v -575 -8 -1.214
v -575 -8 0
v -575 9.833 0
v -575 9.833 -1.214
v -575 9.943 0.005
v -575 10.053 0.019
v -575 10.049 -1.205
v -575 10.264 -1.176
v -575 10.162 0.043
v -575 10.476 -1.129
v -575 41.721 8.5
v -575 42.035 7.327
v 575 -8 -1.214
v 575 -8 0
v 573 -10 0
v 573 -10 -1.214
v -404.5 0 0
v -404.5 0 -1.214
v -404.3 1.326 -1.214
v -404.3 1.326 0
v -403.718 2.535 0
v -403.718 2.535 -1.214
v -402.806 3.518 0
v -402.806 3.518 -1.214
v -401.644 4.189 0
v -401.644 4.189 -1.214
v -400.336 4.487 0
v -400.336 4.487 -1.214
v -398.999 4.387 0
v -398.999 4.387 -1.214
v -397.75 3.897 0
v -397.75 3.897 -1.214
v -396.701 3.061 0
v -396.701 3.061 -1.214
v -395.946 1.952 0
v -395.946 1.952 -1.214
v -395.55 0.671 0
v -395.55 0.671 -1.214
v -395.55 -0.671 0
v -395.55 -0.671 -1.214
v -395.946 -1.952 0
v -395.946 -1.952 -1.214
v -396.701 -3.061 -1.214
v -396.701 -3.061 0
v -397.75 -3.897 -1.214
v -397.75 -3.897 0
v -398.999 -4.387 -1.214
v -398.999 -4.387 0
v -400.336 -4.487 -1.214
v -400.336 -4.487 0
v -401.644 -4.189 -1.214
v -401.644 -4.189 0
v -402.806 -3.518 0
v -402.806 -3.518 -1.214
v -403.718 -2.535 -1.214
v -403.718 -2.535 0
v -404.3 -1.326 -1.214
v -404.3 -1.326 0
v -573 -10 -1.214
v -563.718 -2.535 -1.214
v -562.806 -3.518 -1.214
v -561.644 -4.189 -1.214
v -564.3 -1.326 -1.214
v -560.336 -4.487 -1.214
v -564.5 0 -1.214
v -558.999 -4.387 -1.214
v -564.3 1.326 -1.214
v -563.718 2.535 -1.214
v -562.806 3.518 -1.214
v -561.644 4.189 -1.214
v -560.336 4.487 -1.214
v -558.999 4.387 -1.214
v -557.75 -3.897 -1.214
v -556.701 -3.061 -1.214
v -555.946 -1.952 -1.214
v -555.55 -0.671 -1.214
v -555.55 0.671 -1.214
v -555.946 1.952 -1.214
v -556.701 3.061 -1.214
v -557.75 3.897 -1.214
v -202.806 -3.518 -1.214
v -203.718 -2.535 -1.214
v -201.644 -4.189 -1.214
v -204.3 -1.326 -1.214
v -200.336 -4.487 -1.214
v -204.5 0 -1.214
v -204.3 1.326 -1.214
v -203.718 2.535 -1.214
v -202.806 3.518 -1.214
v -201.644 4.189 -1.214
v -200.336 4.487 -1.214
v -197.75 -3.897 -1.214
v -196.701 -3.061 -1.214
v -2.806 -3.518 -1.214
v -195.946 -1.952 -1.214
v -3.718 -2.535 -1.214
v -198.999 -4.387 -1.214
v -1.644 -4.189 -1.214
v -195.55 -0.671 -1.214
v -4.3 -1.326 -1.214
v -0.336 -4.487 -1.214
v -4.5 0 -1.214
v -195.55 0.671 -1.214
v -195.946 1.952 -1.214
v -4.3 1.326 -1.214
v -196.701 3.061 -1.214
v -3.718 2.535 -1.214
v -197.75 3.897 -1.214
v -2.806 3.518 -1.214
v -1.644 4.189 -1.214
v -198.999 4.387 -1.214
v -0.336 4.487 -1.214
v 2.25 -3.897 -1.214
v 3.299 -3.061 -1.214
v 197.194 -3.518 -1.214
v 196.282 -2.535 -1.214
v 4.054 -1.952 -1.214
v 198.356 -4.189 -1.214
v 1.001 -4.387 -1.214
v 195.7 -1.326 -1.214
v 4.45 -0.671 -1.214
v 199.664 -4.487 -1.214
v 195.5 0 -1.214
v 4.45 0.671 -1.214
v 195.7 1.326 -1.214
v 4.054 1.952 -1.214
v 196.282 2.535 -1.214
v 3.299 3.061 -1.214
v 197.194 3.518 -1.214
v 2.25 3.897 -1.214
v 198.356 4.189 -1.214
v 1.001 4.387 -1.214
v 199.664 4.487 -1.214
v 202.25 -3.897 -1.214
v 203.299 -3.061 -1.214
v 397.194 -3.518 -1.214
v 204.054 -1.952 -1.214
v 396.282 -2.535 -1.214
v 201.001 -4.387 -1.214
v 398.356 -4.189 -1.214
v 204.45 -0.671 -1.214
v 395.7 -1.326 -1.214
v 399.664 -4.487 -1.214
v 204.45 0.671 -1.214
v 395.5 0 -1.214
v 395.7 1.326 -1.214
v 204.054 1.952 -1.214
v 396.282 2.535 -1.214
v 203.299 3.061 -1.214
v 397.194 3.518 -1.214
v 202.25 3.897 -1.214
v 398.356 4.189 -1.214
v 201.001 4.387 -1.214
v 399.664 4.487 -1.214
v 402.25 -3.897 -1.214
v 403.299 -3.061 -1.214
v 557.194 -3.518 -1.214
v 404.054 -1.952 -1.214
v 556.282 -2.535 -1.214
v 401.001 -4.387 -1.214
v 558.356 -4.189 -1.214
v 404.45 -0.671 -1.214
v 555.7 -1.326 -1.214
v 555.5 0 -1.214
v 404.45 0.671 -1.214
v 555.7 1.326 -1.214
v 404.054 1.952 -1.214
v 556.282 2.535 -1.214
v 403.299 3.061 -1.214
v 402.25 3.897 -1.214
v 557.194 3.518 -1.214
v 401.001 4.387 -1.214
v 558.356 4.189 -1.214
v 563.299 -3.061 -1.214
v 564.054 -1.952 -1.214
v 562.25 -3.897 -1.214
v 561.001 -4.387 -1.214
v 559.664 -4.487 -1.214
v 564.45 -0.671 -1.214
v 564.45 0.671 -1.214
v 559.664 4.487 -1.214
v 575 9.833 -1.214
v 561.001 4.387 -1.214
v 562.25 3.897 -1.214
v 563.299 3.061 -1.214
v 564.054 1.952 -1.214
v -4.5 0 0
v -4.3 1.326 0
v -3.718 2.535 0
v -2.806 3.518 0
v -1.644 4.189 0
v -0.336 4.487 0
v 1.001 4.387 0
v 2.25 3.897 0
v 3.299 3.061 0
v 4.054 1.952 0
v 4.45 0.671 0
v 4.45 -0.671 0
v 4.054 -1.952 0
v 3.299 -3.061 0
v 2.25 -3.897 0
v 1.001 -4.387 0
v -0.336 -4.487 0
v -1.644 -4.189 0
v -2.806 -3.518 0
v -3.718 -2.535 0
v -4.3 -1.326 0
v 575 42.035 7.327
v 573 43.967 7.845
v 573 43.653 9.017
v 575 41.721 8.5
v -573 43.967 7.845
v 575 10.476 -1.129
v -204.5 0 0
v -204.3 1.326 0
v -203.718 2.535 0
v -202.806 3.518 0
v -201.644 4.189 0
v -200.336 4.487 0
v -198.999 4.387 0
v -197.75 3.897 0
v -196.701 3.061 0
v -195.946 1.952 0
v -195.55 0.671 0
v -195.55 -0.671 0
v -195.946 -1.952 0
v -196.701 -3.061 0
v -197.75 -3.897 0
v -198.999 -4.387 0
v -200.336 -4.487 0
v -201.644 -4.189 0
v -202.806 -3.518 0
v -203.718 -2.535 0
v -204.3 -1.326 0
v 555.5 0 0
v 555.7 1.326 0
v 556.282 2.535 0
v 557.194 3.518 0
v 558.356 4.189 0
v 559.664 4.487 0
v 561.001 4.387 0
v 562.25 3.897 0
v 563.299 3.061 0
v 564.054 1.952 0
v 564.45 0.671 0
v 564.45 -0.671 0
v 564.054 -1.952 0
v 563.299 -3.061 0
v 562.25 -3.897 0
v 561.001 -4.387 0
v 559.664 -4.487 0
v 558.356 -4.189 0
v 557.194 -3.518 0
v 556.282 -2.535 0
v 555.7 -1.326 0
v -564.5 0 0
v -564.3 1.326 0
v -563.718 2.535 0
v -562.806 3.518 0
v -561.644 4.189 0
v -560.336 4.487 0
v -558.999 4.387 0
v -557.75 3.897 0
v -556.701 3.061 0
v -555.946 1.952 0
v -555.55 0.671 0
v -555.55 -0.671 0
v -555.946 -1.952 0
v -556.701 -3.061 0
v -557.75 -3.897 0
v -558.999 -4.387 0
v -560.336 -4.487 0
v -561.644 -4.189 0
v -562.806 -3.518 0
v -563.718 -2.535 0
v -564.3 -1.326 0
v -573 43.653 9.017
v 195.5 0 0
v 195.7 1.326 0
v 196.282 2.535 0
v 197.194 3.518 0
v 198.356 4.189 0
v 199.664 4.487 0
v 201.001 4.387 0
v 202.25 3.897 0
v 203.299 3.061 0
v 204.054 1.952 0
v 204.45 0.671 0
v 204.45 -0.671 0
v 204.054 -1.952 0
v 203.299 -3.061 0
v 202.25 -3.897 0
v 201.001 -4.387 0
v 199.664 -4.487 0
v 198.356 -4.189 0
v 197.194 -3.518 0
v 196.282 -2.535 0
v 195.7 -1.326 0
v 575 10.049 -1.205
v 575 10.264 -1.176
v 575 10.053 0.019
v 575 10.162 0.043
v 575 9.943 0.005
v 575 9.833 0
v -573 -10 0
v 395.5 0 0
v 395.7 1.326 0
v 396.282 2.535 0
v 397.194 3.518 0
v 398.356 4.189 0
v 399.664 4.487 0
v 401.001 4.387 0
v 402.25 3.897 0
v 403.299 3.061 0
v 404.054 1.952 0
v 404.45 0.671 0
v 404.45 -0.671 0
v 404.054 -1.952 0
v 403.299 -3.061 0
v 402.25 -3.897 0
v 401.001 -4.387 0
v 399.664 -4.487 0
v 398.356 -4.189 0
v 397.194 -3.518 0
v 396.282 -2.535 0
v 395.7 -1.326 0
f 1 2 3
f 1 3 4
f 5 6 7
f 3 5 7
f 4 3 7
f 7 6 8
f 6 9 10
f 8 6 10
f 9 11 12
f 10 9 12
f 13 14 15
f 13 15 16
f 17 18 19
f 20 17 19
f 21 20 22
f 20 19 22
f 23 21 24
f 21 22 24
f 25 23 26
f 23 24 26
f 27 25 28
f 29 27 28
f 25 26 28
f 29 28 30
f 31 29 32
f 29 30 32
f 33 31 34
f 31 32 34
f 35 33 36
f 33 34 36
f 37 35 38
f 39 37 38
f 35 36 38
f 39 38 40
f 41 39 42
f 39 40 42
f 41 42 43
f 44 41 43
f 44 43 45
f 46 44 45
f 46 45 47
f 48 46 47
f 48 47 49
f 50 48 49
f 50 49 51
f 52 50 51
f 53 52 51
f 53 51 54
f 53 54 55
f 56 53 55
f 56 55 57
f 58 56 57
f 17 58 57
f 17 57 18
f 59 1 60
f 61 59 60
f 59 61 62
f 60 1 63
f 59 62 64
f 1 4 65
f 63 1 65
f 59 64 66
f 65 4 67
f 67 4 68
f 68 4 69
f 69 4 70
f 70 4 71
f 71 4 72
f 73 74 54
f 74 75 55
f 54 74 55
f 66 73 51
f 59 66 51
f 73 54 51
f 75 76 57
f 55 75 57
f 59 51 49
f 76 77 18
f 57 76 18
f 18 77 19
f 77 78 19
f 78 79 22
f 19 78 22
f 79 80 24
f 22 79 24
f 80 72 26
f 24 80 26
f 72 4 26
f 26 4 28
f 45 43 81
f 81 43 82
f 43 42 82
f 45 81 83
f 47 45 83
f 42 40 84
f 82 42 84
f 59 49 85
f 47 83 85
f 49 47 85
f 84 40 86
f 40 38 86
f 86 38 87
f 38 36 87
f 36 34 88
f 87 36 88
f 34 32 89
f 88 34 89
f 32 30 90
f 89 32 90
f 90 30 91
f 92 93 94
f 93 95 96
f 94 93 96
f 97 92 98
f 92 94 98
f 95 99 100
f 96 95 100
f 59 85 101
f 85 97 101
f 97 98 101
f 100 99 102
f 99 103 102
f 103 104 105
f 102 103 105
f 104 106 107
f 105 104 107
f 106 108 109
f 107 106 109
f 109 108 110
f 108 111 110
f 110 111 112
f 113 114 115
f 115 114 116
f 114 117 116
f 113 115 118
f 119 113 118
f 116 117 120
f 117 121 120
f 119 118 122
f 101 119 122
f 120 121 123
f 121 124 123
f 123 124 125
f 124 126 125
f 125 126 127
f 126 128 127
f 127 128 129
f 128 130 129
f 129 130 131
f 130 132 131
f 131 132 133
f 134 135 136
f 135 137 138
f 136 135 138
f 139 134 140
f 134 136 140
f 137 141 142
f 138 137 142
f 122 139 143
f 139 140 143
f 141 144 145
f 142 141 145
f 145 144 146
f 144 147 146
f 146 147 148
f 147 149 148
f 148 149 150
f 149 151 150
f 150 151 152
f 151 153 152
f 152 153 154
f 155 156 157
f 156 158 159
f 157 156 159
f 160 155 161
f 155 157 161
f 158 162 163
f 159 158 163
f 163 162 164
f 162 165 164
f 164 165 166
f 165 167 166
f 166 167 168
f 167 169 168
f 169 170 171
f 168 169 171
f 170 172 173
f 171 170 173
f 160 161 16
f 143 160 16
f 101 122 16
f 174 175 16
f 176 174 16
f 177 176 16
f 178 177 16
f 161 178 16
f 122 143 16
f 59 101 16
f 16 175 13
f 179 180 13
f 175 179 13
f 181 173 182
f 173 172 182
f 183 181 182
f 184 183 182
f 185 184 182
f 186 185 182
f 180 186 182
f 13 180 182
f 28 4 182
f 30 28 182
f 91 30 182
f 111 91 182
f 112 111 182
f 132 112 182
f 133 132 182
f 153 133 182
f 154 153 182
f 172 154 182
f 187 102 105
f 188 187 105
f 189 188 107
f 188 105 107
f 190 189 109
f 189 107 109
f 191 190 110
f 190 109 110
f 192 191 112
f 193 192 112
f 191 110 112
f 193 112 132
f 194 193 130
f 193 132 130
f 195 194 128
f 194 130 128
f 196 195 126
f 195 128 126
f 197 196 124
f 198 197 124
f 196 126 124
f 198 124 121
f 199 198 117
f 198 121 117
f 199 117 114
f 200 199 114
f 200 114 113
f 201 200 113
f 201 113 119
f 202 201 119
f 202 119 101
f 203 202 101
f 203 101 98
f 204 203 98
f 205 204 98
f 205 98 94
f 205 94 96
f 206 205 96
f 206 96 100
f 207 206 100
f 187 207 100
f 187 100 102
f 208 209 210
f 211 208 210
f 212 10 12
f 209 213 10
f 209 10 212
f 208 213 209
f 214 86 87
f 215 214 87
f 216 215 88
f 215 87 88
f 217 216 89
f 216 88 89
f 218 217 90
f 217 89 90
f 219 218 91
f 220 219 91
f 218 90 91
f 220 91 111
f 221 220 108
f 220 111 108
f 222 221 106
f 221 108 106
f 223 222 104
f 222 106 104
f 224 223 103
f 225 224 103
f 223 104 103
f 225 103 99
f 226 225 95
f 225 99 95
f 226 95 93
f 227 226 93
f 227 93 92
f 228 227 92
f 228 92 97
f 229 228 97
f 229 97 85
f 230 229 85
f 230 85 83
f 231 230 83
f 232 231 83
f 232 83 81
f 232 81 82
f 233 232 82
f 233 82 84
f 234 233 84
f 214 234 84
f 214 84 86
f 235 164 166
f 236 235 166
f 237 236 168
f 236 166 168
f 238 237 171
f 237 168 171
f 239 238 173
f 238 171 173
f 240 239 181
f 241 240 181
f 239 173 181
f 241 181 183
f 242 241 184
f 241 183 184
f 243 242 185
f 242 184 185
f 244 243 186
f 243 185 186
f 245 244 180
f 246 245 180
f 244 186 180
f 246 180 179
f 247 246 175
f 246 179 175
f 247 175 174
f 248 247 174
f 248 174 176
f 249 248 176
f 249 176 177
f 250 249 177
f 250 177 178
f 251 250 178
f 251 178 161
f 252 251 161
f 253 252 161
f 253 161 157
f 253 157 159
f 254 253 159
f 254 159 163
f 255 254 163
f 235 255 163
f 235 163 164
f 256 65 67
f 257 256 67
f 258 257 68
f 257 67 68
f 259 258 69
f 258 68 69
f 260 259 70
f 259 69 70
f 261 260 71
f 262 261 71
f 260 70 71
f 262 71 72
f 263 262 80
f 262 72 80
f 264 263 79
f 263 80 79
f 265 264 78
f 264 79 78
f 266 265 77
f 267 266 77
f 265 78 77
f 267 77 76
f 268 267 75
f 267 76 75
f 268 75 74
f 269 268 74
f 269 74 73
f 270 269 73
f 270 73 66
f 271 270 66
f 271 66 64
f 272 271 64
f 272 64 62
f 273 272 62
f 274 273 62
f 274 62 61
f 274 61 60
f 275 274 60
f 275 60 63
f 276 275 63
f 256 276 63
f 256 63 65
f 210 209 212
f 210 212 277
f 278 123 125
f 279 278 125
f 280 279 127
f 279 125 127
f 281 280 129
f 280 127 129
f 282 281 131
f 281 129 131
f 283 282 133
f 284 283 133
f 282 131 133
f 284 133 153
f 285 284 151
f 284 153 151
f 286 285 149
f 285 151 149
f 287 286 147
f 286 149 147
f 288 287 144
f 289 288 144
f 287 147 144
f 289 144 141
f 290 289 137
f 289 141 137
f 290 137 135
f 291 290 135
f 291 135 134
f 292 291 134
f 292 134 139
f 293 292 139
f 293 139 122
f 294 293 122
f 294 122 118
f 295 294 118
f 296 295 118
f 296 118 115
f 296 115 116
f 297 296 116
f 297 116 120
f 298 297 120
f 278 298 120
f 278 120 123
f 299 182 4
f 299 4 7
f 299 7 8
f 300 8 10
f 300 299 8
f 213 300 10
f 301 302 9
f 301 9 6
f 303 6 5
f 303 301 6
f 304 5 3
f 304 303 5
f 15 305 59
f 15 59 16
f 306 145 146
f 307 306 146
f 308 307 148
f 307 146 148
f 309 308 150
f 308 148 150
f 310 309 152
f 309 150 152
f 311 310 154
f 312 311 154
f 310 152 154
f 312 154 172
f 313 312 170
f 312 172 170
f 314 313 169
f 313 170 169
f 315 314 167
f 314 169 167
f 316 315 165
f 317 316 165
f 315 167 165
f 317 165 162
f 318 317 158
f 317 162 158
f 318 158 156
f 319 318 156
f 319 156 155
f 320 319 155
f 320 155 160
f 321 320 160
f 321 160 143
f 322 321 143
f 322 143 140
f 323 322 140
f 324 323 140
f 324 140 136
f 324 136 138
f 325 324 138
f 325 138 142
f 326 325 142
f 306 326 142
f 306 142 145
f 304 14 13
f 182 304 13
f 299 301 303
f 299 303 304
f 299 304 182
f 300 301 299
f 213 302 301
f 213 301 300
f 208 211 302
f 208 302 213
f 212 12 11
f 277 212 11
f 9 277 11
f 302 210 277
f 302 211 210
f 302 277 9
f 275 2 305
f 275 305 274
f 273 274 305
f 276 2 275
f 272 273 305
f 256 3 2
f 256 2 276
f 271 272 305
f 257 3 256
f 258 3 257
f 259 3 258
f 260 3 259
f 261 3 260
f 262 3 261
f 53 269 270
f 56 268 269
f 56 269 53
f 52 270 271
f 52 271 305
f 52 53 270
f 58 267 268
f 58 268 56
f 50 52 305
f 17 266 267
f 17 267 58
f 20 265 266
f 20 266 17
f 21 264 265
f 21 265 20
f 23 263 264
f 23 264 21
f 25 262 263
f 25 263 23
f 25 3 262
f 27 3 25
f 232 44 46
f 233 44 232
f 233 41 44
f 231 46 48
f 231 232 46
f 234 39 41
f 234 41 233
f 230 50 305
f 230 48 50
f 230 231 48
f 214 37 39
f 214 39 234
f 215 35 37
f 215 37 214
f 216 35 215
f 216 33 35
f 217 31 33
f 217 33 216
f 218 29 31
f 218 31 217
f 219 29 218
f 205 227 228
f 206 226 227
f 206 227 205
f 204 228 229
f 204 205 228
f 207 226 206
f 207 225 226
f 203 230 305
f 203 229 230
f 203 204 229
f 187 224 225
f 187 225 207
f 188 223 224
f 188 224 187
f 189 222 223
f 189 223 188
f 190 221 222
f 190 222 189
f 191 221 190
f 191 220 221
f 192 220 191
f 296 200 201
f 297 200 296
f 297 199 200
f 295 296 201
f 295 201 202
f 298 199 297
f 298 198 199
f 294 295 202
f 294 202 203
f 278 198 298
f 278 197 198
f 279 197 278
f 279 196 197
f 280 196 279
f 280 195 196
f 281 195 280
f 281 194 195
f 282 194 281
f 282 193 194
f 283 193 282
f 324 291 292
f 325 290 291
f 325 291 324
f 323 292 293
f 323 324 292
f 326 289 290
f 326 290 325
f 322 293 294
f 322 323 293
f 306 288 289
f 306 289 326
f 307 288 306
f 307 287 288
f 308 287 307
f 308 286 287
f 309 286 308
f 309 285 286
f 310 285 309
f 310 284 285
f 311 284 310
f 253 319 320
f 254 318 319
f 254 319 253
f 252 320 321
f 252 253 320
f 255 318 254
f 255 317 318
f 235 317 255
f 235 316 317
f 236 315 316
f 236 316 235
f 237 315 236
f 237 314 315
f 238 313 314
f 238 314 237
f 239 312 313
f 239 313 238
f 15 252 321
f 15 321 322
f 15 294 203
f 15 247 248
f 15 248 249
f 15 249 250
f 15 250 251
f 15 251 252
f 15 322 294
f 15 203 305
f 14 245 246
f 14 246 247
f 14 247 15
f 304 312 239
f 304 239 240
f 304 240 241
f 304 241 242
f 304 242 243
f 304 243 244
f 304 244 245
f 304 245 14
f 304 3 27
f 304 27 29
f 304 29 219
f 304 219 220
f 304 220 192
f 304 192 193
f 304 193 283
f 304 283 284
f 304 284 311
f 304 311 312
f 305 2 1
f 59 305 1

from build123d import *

# Parameters (mm, degrees)
SKETCH1_W                    = 1150
SKETCH1_H                    = 20
BASE_FLANGE1_DEPTH           = 1.21412
EDGE_FLANGE1_STRIP_CUT_DEPTH = 1150
EDGE_FLANGE1_DEPTH           = 1150
M8_CLEARANCE_HOLE1_D         = 9
CHAMFER1_SIZE                = 2


# Sheet-metal steps are written as plain solids
with BuildPart() as part:
    # Sketch1 → Base-Flange1 (new body)
    with BuildSketch(Plane.XY):
        Rectangle(SKETCH1_W, SKETCH1_H)
    extrude(amount=-BASE_FLANGE1_DEPTH)

    # Edge-Flange1 strip (across the edge) → Edge-Flange1 strip cut (cut)
    with BuildSketch(Plane(origin=(575, 10, 0), x_dir=(0, -0.2588190451025146, 0.96592582628907), z_dir=(-1, 0, 0))):
        Polygon((-3.043825554, 6.668712161), (-1.129475664, -0.475738894), (0.043274201, -0.161501515), (-1.87107569, 6.98294954), align=None)
    extrude(amount=EDGE_FLANGE1_STRIP_CUT_DEPTH, mode=Mode.SUBTRACT)

    # Edge-Flange1 section (across the edge) → Edge-Flange1 (add)
    with BuildSketch(Plane(origin=(575, 10, 0), x_dir=(0, -0.2588190451025146, 0.96592582628907), z_dir=(-1, 0, 0))):
        with BuildLine():
            Line((-1.21412, 0.167198672), (-1.21412, 34.84015807))
            Line((-1.21412, 34.84015807), (0, 34.84015807))
            Line((0, 34.84015807), (0, 0.167198672))
            ThreePointArc((0, 0.167198672), (0.010865026, 0.001430408), (0.043274201, -0.161501515))
            Line((0.043274201, -0.161501515), (-1.129475664, -0.475738894))
            ThreePointArc((-1.129475664, -0.475738894), (-1.192868009, -0.157044053), (-1.21412, 0.167198672))
        make_face()
    extrude(amount=EDGE_FLANGE1_DEPTH)

    # M8 Clearance Hole1 (through all)
    with Locations(Plane.XY):
        with Locations((560, 0), (400, 0), (200, 0), (0, 0), (-200, 0), (-400, 0), (-560, 0)):
            Hole(M8_CLEARANCE_HOLE1_D / 2)

    # Chamfer1
    chamfer1_edges = [part.edges().sort_by_distance(p)[0] for p in [
        (575, 43.810127161, 8.430921511),
        (-575, 43.810127161, 8.430921511),
        (575, -10, -0.60706),
        (-575, -10, -0.60706),
    ]]
    chamfer(chamfer1_edges, length=CHAMFER1_SIZE)


solid = part.part
